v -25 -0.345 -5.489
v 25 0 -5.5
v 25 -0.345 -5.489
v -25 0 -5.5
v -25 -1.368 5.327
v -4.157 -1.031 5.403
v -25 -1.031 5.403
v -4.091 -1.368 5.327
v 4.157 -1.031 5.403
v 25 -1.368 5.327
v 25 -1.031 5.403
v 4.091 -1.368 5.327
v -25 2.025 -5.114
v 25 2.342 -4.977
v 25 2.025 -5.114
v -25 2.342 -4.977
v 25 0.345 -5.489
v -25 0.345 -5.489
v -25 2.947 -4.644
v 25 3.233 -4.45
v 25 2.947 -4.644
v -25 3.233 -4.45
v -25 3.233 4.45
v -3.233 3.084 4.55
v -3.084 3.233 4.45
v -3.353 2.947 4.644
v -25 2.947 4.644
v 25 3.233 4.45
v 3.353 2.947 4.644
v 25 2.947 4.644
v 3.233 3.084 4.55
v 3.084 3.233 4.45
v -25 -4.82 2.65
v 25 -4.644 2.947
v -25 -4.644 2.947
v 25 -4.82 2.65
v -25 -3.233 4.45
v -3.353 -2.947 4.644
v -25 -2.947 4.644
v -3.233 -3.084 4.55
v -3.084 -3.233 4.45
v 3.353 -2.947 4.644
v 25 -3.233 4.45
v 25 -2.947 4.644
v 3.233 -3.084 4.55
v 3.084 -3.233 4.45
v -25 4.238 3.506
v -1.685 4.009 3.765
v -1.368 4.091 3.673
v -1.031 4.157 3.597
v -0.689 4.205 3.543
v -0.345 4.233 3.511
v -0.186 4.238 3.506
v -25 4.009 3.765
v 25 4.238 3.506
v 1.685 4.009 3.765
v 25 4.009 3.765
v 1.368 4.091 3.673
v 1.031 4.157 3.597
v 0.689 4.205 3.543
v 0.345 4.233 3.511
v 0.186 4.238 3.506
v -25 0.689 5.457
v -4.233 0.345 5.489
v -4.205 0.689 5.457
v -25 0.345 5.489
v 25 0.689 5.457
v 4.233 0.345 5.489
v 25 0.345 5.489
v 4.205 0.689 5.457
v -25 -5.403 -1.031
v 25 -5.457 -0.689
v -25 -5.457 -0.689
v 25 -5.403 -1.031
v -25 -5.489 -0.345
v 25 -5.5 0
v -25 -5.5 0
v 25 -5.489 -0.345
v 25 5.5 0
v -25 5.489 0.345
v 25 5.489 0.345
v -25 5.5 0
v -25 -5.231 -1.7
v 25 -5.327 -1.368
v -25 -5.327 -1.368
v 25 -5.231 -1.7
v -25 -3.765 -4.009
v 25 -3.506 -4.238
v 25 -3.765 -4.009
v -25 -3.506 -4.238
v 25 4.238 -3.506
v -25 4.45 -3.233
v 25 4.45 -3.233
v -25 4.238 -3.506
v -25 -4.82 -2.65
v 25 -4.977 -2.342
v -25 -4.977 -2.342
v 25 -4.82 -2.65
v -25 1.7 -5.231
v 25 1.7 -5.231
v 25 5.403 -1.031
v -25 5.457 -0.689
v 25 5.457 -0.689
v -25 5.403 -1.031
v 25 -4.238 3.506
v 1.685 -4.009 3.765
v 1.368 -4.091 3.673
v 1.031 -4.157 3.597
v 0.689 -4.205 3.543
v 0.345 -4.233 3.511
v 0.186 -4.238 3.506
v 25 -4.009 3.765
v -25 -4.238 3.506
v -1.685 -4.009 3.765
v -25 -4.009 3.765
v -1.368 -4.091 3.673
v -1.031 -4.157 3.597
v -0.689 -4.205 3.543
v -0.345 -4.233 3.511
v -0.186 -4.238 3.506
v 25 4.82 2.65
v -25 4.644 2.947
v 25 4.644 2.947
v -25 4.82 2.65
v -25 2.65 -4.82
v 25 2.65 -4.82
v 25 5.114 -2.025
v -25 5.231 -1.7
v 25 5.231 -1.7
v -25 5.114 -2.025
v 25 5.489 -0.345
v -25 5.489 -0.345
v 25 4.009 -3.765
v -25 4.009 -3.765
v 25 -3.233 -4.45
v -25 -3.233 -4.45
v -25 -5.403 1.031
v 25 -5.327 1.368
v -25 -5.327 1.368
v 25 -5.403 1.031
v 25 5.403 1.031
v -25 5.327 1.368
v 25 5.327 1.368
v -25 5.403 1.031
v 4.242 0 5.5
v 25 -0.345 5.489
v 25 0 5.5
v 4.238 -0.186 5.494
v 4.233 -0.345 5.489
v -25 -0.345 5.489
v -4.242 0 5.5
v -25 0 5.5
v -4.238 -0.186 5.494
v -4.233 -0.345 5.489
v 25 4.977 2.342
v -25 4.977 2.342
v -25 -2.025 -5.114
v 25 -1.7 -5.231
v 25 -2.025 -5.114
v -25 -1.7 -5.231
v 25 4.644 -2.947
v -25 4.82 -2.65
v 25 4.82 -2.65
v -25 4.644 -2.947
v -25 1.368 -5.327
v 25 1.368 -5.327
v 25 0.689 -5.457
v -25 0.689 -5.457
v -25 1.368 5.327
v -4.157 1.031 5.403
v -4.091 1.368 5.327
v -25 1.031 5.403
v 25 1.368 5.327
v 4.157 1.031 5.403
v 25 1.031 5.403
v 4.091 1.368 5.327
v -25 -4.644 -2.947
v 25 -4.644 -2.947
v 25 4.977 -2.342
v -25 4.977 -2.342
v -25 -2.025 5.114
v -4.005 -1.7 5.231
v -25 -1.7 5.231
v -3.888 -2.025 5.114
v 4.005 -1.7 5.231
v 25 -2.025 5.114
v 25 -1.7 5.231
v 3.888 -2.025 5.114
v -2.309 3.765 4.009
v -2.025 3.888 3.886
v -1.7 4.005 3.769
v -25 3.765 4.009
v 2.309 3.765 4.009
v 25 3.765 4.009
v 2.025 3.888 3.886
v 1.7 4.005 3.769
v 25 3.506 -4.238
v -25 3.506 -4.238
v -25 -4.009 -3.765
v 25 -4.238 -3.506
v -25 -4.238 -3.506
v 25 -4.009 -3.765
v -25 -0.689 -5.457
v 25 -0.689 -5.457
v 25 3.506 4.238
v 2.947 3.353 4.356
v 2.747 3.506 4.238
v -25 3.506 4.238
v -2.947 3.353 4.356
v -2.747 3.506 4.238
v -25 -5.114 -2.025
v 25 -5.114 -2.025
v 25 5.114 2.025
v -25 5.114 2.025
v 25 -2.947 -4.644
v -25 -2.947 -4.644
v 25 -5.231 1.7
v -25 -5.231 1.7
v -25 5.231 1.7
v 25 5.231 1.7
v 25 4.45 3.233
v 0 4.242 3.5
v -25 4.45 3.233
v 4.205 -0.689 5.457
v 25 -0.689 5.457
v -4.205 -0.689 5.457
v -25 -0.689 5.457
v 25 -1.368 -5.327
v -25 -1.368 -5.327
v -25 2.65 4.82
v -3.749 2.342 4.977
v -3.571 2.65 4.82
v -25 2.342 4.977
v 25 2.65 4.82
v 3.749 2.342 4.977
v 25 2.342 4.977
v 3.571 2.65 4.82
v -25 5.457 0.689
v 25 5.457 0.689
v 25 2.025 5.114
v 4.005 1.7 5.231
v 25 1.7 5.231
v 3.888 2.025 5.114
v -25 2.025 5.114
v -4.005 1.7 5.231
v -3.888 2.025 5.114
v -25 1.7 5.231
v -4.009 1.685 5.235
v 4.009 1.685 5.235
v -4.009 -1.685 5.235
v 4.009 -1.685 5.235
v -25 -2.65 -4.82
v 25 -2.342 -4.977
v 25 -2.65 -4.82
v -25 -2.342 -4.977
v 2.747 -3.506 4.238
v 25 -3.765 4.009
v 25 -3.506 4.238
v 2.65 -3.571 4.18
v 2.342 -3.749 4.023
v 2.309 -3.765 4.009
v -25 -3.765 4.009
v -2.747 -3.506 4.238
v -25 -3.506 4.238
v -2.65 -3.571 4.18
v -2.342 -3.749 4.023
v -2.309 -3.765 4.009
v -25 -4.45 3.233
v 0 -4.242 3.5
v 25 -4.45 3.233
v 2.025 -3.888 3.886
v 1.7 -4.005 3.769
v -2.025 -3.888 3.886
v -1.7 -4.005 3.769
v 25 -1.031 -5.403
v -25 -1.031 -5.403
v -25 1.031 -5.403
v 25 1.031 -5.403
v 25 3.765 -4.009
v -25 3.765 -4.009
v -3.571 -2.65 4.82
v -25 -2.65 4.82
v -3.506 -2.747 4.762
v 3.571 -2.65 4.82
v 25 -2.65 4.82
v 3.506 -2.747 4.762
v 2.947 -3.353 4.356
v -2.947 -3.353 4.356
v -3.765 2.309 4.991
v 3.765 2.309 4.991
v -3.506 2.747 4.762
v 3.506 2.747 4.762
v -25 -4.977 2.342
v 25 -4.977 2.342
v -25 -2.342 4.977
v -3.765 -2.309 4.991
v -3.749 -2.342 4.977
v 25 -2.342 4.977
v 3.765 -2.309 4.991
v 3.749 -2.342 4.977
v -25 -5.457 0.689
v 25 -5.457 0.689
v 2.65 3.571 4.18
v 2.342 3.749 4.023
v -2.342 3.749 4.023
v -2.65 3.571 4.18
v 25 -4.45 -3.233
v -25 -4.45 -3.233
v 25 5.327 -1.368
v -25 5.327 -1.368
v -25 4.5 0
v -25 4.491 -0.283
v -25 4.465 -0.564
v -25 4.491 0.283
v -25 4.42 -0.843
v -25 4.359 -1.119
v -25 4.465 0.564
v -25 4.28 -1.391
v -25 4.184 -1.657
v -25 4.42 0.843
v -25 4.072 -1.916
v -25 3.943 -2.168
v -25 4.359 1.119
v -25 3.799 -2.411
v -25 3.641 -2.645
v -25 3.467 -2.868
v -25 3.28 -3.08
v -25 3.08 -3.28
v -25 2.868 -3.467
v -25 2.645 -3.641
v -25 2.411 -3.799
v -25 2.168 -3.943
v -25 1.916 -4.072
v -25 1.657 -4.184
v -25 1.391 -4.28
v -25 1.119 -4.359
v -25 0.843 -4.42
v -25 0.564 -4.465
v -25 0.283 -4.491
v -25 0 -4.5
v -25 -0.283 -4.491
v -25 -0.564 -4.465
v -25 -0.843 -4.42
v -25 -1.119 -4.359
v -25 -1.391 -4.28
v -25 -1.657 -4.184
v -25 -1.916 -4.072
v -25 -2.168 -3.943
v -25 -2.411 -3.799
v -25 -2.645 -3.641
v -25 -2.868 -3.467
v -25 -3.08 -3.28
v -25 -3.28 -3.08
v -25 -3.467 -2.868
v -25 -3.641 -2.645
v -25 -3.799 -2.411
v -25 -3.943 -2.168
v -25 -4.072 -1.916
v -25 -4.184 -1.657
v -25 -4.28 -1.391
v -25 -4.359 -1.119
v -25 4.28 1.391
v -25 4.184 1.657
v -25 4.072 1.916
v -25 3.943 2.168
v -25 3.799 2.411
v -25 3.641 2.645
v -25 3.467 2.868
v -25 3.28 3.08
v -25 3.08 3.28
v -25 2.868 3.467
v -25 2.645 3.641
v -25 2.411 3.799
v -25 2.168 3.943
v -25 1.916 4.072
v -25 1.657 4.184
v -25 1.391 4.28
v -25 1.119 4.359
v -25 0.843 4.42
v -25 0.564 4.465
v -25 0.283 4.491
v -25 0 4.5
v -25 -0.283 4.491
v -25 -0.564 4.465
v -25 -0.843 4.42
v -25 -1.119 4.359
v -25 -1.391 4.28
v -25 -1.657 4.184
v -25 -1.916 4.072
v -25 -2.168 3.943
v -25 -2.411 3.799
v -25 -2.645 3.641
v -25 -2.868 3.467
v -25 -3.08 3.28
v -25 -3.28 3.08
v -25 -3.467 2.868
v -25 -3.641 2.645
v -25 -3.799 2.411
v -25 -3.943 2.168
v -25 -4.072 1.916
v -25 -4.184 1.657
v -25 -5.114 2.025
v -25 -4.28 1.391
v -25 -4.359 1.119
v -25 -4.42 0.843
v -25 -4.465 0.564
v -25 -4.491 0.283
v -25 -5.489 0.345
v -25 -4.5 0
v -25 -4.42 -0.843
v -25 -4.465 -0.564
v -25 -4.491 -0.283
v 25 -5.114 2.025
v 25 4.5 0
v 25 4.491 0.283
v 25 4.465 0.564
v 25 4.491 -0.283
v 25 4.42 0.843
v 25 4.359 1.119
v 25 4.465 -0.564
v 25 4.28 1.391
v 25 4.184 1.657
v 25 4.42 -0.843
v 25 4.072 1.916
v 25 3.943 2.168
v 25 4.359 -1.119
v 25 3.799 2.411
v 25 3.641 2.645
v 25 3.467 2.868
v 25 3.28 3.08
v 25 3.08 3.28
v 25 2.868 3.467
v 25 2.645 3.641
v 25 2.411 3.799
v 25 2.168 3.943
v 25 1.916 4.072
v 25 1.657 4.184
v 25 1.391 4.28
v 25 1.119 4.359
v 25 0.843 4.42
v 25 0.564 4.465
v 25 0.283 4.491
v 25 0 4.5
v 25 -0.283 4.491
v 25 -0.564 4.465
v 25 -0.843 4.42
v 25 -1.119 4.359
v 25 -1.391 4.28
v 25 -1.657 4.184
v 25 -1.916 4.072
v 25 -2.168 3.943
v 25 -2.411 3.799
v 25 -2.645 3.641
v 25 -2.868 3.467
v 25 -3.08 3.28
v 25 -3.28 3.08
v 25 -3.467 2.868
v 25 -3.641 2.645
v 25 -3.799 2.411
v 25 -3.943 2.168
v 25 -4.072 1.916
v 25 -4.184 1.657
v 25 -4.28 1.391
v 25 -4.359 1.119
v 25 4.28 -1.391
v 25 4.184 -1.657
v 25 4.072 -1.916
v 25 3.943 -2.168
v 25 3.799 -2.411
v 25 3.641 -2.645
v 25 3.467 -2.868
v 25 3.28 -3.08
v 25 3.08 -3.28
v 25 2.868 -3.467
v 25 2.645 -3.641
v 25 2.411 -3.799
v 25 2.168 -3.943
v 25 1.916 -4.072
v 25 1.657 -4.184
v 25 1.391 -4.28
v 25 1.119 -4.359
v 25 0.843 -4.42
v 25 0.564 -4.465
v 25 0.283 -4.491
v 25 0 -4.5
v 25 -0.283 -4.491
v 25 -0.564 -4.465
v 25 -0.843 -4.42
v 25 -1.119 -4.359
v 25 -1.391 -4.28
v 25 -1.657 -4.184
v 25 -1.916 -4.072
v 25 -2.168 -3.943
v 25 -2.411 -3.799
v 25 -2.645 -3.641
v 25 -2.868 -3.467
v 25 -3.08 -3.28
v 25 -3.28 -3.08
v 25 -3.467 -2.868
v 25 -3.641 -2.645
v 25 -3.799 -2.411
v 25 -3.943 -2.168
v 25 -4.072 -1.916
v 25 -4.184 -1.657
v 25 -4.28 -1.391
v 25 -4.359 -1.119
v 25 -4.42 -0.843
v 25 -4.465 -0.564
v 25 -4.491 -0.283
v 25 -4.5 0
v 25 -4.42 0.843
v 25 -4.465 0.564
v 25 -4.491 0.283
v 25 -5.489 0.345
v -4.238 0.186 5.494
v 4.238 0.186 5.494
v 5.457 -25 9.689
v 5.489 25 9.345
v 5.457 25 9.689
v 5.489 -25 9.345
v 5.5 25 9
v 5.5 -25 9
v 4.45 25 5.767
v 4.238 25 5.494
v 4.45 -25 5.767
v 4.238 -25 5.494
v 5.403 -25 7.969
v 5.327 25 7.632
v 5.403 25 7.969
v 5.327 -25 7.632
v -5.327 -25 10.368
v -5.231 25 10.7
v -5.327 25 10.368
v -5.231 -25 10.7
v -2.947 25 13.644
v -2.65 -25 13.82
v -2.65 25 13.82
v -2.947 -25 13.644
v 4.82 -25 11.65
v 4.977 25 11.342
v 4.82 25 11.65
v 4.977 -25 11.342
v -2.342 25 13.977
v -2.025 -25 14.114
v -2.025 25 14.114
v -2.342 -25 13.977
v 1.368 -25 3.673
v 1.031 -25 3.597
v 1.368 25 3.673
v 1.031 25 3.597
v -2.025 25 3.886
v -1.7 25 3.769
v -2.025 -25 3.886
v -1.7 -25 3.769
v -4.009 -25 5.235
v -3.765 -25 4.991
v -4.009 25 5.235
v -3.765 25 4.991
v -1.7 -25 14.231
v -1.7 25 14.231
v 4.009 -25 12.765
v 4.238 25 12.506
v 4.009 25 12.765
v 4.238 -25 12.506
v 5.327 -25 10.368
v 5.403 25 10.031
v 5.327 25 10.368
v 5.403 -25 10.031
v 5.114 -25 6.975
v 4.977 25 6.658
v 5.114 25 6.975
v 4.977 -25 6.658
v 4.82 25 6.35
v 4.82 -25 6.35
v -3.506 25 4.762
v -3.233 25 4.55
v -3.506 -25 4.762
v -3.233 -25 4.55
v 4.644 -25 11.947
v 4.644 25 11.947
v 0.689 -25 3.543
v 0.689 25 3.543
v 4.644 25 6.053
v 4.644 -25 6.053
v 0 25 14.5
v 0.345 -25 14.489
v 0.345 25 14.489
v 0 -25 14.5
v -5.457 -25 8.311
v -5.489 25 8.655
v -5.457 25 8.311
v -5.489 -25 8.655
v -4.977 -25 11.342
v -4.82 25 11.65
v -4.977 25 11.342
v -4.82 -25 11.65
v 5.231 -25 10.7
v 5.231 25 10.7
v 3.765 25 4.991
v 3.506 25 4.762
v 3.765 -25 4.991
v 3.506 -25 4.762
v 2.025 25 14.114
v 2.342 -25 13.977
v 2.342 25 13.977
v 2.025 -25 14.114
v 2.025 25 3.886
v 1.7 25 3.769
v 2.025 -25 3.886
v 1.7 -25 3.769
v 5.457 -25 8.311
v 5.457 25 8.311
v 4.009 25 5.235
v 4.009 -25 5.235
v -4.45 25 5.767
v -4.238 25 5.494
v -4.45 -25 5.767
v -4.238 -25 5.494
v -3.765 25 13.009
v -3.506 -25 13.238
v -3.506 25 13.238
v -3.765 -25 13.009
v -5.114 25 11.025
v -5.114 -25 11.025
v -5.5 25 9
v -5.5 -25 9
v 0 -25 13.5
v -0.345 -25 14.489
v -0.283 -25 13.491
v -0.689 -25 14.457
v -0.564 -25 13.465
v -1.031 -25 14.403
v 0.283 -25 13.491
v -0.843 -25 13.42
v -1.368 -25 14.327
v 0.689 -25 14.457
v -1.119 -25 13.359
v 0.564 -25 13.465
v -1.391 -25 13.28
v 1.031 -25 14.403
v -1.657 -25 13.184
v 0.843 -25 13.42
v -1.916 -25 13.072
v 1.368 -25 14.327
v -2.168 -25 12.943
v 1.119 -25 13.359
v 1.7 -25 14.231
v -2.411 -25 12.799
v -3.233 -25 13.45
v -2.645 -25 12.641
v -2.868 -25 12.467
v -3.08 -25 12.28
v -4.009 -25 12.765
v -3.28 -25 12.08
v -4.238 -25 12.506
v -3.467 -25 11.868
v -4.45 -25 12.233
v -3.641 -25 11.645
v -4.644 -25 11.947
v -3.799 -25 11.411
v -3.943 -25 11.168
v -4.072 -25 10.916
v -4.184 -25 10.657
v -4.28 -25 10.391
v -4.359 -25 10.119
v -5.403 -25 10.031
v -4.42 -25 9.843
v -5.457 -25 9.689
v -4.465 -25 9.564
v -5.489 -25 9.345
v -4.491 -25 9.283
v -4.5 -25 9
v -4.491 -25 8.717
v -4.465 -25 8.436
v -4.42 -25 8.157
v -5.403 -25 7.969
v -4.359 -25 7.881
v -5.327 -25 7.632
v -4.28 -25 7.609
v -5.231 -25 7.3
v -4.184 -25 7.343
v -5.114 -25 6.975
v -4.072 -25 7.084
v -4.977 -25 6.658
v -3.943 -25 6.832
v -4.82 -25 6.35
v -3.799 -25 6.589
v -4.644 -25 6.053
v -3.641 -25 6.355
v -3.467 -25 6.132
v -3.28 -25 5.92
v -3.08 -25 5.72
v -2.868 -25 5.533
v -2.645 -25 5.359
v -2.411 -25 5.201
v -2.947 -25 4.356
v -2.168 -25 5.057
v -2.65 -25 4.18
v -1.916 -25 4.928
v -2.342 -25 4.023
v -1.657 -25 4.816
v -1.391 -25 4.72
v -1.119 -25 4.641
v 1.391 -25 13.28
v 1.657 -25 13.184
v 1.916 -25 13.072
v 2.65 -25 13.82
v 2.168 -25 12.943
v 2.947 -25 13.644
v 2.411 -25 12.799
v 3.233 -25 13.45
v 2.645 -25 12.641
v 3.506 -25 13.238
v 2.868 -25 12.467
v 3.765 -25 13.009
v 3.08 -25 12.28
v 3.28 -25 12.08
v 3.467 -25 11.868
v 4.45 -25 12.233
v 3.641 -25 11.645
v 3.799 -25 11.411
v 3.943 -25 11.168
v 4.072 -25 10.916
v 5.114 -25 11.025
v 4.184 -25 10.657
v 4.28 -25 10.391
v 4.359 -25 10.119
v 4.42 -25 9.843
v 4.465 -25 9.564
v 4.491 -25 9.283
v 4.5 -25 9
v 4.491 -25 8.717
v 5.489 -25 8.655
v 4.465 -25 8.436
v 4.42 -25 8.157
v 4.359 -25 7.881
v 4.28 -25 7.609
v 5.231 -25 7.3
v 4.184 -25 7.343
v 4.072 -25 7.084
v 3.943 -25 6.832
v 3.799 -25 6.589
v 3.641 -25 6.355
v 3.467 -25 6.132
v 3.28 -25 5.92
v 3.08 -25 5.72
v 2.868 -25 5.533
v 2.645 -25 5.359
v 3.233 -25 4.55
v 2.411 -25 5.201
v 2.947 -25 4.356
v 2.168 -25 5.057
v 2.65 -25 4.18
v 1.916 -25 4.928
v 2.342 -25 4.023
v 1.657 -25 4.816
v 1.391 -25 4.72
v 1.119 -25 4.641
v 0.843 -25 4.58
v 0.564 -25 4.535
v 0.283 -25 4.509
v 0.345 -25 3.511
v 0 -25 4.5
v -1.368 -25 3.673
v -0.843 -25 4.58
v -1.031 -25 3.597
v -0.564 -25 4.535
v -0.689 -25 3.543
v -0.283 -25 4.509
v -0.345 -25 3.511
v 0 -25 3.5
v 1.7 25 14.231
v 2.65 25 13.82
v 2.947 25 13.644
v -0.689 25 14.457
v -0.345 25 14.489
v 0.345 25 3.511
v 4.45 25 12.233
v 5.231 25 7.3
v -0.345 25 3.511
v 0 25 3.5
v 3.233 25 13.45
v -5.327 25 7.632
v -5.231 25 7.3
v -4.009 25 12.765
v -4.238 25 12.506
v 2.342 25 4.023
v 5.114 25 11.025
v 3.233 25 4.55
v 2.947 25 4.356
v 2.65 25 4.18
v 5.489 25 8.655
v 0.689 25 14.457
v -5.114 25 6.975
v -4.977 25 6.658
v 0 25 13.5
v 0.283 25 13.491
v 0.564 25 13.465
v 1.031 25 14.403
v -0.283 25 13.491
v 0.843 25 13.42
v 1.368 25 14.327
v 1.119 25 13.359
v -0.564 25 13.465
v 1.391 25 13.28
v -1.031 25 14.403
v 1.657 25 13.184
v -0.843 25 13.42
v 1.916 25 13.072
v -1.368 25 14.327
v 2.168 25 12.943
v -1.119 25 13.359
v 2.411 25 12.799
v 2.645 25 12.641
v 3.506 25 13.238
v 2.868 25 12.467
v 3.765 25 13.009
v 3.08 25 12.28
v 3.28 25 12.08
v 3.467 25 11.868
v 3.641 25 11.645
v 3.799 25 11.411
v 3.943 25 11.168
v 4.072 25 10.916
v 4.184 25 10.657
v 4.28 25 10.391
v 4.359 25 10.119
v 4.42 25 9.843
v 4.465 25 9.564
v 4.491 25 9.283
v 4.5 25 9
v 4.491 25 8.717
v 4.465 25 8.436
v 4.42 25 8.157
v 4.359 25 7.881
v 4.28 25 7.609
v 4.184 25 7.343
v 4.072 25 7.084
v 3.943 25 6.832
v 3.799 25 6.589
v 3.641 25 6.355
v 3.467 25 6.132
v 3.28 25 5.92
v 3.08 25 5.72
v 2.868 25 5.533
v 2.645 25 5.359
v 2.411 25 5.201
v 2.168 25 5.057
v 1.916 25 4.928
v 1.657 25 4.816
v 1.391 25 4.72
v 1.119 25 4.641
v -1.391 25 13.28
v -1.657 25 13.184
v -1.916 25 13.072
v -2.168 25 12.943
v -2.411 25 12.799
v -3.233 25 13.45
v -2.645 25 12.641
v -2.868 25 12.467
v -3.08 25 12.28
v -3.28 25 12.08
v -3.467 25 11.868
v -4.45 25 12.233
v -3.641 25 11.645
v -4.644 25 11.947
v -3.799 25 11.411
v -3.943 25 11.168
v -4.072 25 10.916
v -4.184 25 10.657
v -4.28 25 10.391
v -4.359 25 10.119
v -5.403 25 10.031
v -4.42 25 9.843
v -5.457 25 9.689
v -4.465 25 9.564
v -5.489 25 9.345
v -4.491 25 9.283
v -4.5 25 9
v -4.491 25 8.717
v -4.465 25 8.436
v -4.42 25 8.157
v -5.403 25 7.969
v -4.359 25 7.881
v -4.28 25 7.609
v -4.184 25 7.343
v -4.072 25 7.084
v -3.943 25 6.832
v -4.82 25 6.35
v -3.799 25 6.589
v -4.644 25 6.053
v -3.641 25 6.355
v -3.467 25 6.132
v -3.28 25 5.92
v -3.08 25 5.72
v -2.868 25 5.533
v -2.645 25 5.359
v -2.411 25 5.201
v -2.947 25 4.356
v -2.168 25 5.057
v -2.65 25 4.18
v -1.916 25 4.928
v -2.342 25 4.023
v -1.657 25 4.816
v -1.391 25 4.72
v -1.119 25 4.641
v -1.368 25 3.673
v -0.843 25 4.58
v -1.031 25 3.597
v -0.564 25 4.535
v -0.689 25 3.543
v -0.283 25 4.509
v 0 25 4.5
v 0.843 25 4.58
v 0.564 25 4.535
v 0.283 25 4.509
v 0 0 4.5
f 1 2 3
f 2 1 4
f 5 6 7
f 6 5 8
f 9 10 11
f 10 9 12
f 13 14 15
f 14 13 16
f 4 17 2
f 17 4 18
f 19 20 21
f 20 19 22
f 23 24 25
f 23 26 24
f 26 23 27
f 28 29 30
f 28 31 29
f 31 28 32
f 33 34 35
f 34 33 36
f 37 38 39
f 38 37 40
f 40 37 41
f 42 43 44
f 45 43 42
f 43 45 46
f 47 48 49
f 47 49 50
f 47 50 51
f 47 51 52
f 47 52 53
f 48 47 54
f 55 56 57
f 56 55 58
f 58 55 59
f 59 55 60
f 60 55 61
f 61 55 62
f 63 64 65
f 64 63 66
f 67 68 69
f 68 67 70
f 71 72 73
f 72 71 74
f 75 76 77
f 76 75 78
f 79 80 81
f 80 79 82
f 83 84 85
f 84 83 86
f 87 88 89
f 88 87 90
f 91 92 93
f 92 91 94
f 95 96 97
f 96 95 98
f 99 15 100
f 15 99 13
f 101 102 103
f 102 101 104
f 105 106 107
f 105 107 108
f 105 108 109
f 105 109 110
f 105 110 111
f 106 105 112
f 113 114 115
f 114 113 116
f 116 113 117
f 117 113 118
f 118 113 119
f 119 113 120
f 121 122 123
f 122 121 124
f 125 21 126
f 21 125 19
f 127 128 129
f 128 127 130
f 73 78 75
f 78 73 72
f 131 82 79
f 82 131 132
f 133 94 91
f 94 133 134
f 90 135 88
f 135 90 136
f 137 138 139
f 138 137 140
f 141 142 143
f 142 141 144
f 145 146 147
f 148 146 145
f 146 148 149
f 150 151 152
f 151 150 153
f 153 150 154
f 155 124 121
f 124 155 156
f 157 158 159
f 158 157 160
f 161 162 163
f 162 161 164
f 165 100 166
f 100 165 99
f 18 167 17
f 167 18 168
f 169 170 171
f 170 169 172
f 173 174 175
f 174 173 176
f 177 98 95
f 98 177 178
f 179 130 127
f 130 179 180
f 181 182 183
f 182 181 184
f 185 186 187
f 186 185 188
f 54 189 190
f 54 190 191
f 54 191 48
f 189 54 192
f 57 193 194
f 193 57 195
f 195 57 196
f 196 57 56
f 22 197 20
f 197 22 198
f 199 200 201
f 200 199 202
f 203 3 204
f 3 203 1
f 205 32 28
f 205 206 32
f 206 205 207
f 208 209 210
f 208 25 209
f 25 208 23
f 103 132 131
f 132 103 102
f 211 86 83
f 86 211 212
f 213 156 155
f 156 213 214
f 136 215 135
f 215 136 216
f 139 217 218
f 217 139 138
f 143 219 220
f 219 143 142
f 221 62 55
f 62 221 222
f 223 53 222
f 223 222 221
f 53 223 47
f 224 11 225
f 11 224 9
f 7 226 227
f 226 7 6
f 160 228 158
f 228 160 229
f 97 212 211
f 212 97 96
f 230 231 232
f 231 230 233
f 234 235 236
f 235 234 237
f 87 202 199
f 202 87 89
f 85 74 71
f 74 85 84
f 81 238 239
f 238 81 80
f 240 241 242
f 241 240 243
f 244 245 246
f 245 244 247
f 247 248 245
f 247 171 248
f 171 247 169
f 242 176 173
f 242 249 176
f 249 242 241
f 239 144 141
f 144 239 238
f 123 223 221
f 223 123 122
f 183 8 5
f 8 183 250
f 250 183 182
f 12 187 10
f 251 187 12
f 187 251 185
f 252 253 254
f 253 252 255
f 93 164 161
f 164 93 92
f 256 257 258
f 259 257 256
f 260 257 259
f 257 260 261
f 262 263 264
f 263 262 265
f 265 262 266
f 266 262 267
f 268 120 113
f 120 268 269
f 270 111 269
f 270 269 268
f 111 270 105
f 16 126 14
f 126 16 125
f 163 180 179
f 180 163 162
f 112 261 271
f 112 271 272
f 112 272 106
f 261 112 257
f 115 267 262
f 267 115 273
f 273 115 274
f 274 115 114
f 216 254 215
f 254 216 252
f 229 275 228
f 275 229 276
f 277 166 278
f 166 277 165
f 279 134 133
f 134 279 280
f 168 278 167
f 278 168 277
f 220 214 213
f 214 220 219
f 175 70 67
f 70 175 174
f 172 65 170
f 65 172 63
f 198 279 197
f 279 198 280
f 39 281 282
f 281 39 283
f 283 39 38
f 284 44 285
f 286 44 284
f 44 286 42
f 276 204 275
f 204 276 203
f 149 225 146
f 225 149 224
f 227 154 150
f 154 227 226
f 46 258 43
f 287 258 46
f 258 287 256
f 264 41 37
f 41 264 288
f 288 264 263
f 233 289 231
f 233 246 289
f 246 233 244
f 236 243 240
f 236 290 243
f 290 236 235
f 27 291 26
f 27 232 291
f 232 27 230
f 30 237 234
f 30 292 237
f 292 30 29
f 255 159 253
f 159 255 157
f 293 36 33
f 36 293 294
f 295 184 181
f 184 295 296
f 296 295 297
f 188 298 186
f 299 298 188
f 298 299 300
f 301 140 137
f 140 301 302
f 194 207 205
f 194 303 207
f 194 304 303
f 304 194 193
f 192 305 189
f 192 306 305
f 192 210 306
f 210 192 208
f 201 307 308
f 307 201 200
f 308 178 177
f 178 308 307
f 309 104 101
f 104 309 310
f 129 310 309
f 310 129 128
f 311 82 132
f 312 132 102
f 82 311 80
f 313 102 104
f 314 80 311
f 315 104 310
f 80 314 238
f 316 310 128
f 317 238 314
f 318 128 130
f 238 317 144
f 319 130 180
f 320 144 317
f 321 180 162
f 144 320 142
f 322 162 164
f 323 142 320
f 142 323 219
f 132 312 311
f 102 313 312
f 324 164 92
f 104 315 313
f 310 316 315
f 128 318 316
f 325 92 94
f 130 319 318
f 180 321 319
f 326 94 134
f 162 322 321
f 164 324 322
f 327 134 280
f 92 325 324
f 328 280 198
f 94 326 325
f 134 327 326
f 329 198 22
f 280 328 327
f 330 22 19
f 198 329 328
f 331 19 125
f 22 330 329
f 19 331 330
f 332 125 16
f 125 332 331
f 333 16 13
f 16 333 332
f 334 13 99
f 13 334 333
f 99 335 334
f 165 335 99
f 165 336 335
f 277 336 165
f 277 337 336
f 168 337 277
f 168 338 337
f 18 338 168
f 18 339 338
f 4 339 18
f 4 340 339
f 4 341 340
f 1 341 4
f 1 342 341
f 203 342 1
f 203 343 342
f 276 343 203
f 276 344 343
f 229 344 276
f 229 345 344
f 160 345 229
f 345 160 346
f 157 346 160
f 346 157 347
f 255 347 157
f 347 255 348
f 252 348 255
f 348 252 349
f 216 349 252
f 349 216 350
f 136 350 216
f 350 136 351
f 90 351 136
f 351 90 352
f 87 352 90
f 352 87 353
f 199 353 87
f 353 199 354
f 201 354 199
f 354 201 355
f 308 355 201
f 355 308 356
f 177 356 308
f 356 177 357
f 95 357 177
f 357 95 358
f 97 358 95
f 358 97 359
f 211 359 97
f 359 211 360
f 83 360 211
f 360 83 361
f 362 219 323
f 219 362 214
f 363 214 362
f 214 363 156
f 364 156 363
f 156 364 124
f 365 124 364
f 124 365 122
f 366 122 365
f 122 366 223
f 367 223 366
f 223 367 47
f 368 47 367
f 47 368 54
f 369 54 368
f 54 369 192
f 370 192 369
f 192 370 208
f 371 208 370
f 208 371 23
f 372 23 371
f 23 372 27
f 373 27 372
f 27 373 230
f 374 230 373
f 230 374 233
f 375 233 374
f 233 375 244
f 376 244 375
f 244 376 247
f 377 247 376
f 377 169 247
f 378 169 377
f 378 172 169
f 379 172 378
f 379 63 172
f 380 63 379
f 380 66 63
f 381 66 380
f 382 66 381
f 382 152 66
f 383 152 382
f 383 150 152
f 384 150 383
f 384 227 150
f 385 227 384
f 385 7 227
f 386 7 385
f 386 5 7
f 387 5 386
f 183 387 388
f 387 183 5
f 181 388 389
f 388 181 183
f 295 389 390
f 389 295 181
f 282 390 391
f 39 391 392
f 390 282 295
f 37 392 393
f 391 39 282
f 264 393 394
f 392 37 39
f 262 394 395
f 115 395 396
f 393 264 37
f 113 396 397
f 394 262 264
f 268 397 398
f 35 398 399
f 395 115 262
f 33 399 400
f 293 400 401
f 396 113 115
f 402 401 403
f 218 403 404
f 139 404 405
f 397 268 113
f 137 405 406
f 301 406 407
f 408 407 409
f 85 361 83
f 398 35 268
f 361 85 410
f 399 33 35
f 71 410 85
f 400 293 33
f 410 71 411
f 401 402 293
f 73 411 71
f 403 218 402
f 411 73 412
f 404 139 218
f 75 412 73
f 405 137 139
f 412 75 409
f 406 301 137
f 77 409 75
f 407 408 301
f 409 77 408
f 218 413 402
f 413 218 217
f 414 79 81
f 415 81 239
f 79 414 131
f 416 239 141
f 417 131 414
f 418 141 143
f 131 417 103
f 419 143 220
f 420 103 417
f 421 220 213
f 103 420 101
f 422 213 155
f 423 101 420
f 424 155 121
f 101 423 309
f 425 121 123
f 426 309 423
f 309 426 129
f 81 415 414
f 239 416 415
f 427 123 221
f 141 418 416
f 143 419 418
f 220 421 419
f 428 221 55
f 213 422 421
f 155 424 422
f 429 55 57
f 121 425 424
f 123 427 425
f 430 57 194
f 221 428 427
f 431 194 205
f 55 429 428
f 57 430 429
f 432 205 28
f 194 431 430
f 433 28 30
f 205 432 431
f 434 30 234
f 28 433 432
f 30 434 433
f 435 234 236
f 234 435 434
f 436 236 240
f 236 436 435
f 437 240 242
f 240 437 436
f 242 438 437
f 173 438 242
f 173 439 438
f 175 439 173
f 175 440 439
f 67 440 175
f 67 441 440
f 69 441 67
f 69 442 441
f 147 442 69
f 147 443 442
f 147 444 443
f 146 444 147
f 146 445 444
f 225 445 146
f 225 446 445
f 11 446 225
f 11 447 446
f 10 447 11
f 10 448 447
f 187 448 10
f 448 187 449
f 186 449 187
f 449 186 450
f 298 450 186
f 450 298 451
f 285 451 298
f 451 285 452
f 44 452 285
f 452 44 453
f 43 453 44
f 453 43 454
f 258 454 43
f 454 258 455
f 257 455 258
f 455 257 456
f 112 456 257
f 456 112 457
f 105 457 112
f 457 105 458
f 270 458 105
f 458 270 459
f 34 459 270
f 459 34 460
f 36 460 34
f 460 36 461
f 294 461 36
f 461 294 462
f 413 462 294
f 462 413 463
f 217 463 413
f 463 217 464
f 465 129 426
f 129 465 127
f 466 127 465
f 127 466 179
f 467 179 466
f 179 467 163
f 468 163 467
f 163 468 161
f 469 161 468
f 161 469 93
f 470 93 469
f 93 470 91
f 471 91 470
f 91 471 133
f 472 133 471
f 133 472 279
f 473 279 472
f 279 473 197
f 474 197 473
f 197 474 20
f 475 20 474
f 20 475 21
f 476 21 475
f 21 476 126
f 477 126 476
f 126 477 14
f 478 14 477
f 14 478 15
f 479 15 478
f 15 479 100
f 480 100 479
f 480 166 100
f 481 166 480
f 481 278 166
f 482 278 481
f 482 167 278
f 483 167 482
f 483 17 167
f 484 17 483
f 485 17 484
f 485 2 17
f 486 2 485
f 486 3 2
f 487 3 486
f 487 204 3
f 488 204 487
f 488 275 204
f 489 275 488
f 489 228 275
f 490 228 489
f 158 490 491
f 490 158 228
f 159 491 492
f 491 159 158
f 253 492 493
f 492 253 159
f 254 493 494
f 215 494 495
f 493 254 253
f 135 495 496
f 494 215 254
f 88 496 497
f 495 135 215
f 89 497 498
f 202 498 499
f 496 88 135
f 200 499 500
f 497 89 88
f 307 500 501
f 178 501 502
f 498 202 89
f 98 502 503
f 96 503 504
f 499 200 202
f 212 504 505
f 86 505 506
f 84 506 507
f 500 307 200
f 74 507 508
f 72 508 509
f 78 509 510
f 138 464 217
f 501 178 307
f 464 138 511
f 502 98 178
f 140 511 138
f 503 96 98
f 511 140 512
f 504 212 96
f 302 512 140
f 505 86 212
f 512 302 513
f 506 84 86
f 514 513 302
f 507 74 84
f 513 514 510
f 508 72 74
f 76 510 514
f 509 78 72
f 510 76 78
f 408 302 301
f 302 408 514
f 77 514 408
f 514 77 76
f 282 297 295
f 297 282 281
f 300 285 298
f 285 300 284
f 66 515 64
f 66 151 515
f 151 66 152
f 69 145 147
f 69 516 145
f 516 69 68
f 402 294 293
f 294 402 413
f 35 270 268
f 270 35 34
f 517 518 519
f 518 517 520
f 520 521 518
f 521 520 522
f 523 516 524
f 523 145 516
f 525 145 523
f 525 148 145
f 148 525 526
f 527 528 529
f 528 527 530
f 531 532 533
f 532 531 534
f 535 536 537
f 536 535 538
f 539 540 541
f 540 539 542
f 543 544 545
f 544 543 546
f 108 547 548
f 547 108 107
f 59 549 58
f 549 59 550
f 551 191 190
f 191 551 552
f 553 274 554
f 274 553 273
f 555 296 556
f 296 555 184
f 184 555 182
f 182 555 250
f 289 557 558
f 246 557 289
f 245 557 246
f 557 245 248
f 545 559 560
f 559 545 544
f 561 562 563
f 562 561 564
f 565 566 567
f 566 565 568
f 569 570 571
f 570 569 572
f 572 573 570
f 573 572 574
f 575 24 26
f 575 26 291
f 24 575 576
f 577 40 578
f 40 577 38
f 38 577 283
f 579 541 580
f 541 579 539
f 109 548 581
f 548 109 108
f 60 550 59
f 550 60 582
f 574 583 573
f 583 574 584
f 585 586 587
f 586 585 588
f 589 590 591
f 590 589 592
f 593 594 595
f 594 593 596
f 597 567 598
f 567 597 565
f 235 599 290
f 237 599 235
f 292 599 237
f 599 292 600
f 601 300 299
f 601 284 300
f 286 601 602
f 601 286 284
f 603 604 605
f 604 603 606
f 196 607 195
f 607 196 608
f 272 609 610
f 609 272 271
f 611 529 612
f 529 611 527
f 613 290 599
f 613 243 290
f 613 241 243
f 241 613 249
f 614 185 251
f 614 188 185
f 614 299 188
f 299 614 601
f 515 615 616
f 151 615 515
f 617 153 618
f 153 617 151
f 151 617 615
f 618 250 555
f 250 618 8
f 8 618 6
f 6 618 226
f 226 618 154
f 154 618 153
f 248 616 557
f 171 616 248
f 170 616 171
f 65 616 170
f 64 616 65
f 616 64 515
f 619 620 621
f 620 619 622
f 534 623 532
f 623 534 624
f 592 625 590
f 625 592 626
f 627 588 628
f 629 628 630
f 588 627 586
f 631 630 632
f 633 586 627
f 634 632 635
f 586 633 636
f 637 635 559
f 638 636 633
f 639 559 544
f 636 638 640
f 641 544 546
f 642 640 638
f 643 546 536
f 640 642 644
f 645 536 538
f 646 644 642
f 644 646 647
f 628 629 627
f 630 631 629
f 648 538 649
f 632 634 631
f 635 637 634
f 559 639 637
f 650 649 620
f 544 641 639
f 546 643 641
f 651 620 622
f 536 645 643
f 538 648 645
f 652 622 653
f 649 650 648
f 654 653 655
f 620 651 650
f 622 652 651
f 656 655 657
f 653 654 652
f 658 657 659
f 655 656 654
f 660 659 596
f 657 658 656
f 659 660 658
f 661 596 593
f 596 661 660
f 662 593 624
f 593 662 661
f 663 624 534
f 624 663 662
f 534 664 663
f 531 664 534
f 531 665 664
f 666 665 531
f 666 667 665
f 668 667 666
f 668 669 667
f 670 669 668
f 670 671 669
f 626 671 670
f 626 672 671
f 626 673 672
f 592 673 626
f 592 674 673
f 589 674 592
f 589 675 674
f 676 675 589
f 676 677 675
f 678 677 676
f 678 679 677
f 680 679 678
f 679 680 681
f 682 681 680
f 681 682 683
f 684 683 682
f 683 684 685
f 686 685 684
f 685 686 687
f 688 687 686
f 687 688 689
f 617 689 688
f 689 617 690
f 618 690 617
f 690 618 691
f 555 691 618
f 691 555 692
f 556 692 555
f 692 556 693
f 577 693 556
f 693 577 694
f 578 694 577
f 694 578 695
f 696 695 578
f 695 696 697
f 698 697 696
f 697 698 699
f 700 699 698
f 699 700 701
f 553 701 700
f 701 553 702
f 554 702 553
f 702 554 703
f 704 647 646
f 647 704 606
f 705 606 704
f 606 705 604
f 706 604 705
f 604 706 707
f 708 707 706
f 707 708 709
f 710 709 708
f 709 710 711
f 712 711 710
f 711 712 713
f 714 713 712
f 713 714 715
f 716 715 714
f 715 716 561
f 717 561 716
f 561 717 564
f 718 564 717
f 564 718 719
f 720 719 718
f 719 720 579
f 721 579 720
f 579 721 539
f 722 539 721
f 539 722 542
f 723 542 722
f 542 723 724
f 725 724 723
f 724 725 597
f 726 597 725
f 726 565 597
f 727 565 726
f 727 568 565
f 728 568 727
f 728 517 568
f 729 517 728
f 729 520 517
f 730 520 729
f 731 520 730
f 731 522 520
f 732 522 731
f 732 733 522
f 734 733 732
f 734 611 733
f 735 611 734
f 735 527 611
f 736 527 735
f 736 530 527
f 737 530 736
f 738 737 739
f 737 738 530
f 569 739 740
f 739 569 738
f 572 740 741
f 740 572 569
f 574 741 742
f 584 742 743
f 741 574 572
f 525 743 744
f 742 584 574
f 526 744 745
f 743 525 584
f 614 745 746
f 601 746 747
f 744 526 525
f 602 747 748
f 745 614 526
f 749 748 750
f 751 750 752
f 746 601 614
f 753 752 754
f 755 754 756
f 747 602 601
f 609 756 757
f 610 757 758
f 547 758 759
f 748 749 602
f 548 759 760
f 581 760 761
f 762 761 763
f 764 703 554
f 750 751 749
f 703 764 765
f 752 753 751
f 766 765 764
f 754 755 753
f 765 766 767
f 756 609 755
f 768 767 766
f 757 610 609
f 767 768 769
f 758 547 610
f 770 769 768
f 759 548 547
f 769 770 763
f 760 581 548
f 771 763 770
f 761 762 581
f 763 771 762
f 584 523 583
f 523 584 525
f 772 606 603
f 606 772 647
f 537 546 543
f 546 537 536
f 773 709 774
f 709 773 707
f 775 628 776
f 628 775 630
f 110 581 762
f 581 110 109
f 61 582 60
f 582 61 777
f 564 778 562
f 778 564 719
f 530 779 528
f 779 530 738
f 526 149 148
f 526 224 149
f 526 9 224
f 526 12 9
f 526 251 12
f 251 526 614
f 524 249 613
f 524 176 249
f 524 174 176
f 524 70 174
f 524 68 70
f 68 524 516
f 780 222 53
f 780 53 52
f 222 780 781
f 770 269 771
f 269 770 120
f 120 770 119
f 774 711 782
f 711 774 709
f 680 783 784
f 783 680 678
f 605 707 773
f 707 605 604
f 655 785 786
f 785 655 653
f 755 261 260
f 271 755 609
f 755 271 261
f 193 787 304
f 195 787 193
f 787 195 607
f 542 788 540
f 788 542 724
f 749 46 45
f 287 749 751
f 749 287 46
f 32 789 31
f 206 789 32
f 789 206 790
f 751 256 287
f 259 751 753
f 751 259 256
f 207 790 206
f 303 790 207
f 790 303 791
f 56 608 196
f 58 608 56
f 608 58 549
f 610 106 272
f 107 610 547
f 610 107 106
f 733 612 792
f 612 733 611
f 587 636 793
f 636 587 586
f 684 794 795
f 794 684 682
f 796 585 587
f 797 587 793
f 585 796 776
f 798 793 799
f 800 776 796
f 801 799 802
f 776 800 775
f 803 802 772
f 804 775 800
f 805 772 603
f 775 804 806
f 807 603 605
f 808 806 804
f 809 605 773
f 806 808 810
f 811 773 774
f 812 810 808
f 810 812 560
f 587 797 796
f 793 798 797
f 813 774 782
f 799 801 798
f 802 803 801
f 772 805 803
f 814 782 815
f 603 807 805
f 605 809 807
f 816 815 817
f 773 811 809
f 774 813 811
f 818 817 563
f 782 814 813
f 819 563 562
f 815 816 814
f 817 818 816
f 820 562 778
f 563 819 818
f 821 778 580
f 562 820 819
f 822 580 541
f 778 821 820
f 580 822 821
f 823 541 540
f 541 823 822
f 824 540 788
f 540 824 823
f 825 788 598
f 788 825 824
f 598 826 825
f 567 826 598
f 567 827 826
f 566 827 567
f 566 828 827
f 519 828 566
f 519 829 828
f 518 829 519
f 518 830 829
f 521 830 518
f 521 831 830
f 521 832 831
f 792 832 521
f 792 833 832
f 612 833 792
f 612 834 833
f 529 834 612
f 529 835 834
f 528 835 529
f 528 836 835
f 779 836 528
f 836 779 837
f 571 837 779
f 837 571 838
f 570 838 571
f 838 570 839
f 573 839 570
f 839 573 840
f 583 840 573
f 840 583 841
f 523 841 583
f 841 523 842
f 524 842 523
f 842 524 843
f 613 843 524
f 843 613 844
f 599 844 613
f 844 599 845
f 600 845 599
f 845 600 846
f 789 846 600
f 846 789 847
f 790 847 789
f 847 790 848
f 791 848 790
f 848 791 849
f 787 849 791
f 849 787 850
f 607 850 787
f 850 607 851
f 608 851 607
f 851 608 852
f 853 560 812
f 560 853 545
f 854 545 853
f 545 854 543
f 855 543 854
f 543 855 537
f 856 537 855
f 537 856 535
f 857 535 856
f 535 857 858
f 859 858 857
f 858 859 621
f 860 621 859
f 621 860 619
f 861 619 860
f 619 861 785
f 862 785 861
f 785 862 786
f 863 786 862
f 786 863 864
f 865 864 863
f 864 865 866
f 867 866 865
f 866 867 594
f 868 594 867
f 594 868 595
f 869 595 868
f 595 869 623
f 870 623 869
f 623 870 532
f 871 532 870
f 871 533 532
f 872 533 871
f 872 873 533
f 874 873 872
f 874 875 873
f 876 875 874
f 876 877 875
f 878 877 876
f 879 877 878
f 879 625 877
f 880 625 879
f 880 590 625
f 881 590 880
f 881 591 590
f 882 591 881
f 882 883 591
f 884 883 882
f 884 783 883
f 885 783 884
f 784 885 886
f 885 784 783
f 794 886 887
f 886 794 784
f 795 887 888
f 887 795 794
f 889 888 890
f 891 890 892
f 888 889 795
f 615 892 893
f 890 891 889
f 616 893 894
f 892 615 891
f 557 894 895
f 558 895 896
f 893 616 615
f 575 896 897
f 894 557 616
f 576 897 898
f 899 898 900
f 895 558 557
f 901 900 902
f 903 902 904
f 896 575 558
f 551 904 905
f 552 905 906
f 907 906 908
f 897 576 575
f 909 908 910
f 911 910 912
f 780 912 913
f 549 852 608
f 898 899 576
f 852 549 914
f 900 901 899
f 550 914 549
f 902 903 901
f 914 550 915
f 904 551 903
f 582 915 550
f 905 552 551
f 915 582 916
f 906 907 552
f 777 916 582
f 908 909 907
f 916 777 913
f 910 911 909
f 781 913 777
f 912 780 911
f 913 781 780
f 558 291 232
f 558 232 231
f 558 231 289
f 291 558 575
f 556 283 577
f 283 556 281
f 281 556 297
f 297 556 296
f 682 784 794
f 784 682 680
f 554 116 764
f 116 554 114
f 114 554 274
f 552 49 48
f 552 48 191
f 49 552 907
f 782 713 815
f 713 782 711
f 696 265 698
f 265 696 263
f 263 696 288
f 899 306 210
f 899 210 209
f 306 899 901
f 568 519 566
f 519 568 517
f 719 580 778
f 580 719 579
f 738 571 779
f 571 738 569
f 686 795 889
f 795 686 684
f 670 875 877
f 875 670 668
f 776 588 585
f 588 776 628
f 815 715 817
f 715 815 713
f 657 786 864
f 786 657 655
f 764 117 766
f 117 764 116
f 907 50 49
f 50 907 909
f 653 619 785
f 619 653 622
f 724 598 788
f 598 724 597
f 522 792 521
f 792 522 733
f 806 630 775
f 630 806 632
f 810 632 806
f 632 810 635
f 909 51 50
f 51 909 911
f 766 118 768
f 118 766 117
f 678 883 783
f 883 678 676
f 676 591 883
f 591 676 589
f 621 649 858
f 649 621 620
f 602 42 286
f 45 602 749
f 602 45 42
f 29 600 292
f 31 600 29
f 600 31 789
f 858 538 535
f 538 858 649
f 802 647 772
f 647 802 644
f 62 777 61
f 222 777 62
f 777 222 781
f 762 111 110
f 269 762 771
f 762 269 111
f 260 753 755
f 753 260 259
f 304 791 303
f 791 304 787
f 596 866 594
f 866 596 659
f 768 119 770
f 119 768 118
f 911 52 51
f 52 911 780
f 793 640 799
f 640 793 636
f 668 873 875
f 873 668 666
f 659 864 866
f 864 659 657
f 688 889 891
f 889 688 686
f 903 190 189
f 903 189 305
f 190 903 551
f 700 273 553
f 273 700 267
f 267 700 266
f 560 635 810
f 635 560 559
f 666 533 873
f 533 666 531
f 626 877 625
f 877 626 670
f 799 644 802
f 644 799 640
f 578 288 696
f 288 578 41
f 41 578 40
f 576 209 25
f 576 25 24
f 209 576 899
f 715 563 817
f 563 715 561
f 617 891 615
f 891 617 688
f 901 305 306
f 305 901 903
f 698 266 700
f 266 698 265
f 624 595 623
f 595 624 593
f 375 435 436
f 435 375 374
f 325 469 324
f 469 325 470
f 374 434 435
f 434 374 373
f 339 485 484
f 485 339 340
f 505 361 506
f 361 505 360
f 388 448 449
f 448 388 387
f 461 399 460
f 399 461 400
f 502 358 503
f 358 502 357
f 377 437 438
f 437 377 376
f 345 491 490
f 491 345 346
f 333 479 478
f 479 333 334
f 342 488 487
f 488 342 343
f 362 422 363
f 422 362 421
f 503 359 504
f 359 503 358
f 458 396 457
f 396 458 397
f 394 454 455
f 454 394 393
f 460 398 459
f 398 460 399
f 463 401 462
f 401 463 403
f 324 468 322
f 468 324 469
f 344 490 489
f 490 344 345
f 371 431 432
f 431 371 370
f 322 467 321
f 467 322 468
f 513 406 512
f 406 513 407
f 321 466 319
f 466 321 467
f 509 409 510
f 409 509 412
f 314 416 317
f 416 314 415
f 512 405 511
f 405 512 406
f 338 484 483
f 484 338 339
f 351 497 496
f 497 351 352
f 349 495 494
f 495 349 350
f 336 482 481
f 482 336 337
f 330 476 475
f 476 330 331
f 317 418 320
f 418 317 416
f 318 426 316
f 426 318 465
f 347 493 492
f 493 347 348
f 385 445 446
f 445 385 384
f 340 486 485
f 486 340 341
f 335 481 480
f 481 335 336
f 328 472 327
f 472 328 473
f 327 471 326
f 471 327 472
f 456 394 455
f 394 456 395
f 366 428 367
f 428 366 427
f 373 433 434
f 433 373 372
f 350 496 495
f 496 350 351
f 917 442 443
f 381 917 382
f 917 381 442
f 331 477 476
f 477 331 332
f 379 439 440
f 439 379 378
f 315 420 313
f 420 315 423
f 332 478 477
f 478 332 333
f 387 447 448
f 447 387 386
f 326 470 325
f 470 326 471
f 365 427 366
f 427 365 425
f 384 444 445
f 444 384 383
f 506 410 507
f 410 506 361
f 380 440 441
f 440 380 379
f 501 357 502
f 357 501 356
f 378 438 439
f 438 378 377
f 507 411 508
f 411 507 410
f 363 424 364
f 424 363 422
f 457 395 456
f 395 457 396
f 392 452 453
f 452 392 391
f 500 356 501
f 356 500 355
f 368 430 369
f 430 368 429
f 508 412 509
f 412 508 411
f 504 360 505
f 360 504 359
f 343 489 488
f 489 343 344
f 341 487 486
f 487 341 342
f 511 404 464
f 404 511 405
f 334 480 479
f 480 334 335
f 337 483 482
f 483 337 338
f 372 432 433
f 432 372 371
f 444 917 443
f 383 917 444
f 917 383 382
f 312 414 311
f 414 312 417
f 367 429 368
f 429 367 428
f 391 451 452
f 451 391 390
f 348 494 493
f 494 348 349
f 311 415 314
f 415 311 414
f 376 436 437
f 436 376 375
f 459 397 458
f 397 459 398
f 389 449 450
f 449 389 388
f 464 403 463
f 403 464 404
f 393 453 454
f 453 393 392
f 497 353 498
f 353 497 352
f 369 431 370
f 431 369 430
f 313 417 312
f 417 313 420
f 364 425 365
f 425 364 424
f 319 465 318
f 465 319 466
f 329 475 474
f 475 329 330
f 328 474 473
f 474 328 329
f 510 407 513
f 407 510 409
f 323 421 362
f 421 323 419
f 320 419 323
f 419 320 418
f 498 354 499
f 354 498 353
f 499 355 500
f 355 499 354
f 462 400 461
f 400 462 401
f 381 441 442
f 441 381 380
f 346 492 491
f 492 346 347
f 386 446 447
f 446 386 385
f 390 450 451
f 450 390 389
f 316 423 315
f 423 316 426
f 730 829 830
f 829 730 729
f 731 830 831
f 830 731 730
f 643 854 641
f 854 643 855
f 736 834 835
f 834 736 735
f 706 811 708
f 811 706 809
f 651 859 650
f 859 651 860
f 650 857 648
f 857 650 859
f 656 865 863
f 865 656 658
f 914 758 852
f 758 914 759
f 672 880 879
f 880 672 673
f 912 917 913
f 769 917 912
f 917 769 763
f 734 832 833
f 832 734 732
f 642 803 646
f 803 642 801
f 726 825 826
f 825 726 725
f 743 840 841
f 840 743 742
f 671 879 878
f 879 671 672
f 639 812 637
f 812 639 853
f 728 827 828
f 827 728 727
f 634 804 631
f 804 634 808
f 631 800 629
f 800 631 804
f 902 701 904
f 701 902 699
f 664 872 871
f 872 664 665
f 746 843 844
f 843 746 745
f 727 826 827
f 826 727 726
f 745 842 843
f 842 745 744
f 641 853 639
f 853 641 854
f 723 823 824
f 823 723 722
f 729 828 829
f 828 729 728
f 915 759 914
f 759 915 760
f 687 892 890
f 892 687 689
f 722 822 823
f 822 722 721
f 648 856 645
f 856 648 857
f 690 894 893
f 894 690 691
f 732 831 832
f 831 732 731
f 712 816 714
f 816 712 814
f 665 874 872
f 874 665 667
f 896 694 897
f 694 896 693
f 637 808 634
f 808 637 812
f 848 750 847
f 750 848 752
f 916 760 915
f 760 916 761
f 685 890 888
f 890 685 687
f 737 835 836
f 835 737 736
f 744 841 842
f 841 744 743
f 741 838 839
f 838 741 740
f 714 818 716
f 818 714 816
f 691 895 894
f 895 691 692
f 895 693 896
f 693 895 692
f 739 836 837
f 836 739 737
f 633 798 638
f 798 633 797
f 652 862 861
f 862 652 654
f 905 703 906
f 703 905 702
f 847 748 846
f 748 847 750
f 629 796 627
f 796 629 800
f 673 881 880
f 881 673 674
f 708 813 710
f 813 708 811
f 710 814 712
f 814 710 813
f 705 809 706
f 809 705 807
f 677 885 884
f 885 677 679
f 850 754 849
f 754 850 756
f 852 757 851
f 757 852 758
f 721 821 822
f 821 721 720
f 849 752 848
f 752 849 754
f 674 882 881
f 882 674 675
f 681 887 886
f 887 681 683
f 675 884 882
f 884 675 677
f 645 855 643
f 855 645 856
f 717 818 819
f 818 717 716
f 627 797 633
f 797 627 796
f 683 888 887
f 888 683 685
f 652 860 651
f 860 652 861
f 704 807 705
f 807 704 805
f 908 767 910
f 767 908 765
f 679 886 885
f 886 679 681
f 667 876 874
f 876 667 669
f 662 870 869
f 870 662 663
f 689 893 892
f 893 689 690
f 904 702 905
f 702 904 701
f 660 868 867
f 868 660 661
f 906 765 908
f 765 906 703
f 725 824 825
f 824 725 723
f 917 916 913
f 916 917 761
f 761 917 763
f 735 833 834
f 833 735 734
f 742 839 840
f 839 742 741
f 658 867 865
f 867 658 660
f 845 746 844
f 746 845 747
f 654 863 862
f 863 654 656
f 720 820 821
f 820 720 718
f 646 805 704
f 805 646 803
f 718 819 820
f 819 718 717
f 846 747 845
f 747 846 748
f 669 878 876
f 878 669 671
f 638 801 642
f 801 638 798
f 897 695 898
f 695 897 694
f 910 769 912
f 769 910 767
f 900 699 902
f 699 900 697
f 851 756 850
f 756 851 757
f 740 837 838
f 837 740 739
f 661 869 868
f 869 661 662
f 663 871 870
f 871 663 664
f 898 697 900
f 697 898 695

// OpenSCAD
$fn=100;
distanceCenters=9;
bearingExternalDiameter=9;

xlength=50;
ylength=50;


difference(){
  union() {
    y(bearingExternalDiameter+2);
    x(bearingExternalDiameter+2); 
  }
  y(bearingExternalDiameter);
  x(bearingExternalDiameter);
}

module bearingSpaces(){
  y(bearingExternalDiameter);
  x(bearingExternalDiameter);
}

module y(diameter){
rotate([0, 90, 0])
  cylinder(h=ylength, d=diameter, center=true);
}
 
module x(diameter){
translate([0, 0, distanceCenters])
  rotate([90, 0, 0])
    cylinder(h=xlength, d=diameter, center=true);
}
 
